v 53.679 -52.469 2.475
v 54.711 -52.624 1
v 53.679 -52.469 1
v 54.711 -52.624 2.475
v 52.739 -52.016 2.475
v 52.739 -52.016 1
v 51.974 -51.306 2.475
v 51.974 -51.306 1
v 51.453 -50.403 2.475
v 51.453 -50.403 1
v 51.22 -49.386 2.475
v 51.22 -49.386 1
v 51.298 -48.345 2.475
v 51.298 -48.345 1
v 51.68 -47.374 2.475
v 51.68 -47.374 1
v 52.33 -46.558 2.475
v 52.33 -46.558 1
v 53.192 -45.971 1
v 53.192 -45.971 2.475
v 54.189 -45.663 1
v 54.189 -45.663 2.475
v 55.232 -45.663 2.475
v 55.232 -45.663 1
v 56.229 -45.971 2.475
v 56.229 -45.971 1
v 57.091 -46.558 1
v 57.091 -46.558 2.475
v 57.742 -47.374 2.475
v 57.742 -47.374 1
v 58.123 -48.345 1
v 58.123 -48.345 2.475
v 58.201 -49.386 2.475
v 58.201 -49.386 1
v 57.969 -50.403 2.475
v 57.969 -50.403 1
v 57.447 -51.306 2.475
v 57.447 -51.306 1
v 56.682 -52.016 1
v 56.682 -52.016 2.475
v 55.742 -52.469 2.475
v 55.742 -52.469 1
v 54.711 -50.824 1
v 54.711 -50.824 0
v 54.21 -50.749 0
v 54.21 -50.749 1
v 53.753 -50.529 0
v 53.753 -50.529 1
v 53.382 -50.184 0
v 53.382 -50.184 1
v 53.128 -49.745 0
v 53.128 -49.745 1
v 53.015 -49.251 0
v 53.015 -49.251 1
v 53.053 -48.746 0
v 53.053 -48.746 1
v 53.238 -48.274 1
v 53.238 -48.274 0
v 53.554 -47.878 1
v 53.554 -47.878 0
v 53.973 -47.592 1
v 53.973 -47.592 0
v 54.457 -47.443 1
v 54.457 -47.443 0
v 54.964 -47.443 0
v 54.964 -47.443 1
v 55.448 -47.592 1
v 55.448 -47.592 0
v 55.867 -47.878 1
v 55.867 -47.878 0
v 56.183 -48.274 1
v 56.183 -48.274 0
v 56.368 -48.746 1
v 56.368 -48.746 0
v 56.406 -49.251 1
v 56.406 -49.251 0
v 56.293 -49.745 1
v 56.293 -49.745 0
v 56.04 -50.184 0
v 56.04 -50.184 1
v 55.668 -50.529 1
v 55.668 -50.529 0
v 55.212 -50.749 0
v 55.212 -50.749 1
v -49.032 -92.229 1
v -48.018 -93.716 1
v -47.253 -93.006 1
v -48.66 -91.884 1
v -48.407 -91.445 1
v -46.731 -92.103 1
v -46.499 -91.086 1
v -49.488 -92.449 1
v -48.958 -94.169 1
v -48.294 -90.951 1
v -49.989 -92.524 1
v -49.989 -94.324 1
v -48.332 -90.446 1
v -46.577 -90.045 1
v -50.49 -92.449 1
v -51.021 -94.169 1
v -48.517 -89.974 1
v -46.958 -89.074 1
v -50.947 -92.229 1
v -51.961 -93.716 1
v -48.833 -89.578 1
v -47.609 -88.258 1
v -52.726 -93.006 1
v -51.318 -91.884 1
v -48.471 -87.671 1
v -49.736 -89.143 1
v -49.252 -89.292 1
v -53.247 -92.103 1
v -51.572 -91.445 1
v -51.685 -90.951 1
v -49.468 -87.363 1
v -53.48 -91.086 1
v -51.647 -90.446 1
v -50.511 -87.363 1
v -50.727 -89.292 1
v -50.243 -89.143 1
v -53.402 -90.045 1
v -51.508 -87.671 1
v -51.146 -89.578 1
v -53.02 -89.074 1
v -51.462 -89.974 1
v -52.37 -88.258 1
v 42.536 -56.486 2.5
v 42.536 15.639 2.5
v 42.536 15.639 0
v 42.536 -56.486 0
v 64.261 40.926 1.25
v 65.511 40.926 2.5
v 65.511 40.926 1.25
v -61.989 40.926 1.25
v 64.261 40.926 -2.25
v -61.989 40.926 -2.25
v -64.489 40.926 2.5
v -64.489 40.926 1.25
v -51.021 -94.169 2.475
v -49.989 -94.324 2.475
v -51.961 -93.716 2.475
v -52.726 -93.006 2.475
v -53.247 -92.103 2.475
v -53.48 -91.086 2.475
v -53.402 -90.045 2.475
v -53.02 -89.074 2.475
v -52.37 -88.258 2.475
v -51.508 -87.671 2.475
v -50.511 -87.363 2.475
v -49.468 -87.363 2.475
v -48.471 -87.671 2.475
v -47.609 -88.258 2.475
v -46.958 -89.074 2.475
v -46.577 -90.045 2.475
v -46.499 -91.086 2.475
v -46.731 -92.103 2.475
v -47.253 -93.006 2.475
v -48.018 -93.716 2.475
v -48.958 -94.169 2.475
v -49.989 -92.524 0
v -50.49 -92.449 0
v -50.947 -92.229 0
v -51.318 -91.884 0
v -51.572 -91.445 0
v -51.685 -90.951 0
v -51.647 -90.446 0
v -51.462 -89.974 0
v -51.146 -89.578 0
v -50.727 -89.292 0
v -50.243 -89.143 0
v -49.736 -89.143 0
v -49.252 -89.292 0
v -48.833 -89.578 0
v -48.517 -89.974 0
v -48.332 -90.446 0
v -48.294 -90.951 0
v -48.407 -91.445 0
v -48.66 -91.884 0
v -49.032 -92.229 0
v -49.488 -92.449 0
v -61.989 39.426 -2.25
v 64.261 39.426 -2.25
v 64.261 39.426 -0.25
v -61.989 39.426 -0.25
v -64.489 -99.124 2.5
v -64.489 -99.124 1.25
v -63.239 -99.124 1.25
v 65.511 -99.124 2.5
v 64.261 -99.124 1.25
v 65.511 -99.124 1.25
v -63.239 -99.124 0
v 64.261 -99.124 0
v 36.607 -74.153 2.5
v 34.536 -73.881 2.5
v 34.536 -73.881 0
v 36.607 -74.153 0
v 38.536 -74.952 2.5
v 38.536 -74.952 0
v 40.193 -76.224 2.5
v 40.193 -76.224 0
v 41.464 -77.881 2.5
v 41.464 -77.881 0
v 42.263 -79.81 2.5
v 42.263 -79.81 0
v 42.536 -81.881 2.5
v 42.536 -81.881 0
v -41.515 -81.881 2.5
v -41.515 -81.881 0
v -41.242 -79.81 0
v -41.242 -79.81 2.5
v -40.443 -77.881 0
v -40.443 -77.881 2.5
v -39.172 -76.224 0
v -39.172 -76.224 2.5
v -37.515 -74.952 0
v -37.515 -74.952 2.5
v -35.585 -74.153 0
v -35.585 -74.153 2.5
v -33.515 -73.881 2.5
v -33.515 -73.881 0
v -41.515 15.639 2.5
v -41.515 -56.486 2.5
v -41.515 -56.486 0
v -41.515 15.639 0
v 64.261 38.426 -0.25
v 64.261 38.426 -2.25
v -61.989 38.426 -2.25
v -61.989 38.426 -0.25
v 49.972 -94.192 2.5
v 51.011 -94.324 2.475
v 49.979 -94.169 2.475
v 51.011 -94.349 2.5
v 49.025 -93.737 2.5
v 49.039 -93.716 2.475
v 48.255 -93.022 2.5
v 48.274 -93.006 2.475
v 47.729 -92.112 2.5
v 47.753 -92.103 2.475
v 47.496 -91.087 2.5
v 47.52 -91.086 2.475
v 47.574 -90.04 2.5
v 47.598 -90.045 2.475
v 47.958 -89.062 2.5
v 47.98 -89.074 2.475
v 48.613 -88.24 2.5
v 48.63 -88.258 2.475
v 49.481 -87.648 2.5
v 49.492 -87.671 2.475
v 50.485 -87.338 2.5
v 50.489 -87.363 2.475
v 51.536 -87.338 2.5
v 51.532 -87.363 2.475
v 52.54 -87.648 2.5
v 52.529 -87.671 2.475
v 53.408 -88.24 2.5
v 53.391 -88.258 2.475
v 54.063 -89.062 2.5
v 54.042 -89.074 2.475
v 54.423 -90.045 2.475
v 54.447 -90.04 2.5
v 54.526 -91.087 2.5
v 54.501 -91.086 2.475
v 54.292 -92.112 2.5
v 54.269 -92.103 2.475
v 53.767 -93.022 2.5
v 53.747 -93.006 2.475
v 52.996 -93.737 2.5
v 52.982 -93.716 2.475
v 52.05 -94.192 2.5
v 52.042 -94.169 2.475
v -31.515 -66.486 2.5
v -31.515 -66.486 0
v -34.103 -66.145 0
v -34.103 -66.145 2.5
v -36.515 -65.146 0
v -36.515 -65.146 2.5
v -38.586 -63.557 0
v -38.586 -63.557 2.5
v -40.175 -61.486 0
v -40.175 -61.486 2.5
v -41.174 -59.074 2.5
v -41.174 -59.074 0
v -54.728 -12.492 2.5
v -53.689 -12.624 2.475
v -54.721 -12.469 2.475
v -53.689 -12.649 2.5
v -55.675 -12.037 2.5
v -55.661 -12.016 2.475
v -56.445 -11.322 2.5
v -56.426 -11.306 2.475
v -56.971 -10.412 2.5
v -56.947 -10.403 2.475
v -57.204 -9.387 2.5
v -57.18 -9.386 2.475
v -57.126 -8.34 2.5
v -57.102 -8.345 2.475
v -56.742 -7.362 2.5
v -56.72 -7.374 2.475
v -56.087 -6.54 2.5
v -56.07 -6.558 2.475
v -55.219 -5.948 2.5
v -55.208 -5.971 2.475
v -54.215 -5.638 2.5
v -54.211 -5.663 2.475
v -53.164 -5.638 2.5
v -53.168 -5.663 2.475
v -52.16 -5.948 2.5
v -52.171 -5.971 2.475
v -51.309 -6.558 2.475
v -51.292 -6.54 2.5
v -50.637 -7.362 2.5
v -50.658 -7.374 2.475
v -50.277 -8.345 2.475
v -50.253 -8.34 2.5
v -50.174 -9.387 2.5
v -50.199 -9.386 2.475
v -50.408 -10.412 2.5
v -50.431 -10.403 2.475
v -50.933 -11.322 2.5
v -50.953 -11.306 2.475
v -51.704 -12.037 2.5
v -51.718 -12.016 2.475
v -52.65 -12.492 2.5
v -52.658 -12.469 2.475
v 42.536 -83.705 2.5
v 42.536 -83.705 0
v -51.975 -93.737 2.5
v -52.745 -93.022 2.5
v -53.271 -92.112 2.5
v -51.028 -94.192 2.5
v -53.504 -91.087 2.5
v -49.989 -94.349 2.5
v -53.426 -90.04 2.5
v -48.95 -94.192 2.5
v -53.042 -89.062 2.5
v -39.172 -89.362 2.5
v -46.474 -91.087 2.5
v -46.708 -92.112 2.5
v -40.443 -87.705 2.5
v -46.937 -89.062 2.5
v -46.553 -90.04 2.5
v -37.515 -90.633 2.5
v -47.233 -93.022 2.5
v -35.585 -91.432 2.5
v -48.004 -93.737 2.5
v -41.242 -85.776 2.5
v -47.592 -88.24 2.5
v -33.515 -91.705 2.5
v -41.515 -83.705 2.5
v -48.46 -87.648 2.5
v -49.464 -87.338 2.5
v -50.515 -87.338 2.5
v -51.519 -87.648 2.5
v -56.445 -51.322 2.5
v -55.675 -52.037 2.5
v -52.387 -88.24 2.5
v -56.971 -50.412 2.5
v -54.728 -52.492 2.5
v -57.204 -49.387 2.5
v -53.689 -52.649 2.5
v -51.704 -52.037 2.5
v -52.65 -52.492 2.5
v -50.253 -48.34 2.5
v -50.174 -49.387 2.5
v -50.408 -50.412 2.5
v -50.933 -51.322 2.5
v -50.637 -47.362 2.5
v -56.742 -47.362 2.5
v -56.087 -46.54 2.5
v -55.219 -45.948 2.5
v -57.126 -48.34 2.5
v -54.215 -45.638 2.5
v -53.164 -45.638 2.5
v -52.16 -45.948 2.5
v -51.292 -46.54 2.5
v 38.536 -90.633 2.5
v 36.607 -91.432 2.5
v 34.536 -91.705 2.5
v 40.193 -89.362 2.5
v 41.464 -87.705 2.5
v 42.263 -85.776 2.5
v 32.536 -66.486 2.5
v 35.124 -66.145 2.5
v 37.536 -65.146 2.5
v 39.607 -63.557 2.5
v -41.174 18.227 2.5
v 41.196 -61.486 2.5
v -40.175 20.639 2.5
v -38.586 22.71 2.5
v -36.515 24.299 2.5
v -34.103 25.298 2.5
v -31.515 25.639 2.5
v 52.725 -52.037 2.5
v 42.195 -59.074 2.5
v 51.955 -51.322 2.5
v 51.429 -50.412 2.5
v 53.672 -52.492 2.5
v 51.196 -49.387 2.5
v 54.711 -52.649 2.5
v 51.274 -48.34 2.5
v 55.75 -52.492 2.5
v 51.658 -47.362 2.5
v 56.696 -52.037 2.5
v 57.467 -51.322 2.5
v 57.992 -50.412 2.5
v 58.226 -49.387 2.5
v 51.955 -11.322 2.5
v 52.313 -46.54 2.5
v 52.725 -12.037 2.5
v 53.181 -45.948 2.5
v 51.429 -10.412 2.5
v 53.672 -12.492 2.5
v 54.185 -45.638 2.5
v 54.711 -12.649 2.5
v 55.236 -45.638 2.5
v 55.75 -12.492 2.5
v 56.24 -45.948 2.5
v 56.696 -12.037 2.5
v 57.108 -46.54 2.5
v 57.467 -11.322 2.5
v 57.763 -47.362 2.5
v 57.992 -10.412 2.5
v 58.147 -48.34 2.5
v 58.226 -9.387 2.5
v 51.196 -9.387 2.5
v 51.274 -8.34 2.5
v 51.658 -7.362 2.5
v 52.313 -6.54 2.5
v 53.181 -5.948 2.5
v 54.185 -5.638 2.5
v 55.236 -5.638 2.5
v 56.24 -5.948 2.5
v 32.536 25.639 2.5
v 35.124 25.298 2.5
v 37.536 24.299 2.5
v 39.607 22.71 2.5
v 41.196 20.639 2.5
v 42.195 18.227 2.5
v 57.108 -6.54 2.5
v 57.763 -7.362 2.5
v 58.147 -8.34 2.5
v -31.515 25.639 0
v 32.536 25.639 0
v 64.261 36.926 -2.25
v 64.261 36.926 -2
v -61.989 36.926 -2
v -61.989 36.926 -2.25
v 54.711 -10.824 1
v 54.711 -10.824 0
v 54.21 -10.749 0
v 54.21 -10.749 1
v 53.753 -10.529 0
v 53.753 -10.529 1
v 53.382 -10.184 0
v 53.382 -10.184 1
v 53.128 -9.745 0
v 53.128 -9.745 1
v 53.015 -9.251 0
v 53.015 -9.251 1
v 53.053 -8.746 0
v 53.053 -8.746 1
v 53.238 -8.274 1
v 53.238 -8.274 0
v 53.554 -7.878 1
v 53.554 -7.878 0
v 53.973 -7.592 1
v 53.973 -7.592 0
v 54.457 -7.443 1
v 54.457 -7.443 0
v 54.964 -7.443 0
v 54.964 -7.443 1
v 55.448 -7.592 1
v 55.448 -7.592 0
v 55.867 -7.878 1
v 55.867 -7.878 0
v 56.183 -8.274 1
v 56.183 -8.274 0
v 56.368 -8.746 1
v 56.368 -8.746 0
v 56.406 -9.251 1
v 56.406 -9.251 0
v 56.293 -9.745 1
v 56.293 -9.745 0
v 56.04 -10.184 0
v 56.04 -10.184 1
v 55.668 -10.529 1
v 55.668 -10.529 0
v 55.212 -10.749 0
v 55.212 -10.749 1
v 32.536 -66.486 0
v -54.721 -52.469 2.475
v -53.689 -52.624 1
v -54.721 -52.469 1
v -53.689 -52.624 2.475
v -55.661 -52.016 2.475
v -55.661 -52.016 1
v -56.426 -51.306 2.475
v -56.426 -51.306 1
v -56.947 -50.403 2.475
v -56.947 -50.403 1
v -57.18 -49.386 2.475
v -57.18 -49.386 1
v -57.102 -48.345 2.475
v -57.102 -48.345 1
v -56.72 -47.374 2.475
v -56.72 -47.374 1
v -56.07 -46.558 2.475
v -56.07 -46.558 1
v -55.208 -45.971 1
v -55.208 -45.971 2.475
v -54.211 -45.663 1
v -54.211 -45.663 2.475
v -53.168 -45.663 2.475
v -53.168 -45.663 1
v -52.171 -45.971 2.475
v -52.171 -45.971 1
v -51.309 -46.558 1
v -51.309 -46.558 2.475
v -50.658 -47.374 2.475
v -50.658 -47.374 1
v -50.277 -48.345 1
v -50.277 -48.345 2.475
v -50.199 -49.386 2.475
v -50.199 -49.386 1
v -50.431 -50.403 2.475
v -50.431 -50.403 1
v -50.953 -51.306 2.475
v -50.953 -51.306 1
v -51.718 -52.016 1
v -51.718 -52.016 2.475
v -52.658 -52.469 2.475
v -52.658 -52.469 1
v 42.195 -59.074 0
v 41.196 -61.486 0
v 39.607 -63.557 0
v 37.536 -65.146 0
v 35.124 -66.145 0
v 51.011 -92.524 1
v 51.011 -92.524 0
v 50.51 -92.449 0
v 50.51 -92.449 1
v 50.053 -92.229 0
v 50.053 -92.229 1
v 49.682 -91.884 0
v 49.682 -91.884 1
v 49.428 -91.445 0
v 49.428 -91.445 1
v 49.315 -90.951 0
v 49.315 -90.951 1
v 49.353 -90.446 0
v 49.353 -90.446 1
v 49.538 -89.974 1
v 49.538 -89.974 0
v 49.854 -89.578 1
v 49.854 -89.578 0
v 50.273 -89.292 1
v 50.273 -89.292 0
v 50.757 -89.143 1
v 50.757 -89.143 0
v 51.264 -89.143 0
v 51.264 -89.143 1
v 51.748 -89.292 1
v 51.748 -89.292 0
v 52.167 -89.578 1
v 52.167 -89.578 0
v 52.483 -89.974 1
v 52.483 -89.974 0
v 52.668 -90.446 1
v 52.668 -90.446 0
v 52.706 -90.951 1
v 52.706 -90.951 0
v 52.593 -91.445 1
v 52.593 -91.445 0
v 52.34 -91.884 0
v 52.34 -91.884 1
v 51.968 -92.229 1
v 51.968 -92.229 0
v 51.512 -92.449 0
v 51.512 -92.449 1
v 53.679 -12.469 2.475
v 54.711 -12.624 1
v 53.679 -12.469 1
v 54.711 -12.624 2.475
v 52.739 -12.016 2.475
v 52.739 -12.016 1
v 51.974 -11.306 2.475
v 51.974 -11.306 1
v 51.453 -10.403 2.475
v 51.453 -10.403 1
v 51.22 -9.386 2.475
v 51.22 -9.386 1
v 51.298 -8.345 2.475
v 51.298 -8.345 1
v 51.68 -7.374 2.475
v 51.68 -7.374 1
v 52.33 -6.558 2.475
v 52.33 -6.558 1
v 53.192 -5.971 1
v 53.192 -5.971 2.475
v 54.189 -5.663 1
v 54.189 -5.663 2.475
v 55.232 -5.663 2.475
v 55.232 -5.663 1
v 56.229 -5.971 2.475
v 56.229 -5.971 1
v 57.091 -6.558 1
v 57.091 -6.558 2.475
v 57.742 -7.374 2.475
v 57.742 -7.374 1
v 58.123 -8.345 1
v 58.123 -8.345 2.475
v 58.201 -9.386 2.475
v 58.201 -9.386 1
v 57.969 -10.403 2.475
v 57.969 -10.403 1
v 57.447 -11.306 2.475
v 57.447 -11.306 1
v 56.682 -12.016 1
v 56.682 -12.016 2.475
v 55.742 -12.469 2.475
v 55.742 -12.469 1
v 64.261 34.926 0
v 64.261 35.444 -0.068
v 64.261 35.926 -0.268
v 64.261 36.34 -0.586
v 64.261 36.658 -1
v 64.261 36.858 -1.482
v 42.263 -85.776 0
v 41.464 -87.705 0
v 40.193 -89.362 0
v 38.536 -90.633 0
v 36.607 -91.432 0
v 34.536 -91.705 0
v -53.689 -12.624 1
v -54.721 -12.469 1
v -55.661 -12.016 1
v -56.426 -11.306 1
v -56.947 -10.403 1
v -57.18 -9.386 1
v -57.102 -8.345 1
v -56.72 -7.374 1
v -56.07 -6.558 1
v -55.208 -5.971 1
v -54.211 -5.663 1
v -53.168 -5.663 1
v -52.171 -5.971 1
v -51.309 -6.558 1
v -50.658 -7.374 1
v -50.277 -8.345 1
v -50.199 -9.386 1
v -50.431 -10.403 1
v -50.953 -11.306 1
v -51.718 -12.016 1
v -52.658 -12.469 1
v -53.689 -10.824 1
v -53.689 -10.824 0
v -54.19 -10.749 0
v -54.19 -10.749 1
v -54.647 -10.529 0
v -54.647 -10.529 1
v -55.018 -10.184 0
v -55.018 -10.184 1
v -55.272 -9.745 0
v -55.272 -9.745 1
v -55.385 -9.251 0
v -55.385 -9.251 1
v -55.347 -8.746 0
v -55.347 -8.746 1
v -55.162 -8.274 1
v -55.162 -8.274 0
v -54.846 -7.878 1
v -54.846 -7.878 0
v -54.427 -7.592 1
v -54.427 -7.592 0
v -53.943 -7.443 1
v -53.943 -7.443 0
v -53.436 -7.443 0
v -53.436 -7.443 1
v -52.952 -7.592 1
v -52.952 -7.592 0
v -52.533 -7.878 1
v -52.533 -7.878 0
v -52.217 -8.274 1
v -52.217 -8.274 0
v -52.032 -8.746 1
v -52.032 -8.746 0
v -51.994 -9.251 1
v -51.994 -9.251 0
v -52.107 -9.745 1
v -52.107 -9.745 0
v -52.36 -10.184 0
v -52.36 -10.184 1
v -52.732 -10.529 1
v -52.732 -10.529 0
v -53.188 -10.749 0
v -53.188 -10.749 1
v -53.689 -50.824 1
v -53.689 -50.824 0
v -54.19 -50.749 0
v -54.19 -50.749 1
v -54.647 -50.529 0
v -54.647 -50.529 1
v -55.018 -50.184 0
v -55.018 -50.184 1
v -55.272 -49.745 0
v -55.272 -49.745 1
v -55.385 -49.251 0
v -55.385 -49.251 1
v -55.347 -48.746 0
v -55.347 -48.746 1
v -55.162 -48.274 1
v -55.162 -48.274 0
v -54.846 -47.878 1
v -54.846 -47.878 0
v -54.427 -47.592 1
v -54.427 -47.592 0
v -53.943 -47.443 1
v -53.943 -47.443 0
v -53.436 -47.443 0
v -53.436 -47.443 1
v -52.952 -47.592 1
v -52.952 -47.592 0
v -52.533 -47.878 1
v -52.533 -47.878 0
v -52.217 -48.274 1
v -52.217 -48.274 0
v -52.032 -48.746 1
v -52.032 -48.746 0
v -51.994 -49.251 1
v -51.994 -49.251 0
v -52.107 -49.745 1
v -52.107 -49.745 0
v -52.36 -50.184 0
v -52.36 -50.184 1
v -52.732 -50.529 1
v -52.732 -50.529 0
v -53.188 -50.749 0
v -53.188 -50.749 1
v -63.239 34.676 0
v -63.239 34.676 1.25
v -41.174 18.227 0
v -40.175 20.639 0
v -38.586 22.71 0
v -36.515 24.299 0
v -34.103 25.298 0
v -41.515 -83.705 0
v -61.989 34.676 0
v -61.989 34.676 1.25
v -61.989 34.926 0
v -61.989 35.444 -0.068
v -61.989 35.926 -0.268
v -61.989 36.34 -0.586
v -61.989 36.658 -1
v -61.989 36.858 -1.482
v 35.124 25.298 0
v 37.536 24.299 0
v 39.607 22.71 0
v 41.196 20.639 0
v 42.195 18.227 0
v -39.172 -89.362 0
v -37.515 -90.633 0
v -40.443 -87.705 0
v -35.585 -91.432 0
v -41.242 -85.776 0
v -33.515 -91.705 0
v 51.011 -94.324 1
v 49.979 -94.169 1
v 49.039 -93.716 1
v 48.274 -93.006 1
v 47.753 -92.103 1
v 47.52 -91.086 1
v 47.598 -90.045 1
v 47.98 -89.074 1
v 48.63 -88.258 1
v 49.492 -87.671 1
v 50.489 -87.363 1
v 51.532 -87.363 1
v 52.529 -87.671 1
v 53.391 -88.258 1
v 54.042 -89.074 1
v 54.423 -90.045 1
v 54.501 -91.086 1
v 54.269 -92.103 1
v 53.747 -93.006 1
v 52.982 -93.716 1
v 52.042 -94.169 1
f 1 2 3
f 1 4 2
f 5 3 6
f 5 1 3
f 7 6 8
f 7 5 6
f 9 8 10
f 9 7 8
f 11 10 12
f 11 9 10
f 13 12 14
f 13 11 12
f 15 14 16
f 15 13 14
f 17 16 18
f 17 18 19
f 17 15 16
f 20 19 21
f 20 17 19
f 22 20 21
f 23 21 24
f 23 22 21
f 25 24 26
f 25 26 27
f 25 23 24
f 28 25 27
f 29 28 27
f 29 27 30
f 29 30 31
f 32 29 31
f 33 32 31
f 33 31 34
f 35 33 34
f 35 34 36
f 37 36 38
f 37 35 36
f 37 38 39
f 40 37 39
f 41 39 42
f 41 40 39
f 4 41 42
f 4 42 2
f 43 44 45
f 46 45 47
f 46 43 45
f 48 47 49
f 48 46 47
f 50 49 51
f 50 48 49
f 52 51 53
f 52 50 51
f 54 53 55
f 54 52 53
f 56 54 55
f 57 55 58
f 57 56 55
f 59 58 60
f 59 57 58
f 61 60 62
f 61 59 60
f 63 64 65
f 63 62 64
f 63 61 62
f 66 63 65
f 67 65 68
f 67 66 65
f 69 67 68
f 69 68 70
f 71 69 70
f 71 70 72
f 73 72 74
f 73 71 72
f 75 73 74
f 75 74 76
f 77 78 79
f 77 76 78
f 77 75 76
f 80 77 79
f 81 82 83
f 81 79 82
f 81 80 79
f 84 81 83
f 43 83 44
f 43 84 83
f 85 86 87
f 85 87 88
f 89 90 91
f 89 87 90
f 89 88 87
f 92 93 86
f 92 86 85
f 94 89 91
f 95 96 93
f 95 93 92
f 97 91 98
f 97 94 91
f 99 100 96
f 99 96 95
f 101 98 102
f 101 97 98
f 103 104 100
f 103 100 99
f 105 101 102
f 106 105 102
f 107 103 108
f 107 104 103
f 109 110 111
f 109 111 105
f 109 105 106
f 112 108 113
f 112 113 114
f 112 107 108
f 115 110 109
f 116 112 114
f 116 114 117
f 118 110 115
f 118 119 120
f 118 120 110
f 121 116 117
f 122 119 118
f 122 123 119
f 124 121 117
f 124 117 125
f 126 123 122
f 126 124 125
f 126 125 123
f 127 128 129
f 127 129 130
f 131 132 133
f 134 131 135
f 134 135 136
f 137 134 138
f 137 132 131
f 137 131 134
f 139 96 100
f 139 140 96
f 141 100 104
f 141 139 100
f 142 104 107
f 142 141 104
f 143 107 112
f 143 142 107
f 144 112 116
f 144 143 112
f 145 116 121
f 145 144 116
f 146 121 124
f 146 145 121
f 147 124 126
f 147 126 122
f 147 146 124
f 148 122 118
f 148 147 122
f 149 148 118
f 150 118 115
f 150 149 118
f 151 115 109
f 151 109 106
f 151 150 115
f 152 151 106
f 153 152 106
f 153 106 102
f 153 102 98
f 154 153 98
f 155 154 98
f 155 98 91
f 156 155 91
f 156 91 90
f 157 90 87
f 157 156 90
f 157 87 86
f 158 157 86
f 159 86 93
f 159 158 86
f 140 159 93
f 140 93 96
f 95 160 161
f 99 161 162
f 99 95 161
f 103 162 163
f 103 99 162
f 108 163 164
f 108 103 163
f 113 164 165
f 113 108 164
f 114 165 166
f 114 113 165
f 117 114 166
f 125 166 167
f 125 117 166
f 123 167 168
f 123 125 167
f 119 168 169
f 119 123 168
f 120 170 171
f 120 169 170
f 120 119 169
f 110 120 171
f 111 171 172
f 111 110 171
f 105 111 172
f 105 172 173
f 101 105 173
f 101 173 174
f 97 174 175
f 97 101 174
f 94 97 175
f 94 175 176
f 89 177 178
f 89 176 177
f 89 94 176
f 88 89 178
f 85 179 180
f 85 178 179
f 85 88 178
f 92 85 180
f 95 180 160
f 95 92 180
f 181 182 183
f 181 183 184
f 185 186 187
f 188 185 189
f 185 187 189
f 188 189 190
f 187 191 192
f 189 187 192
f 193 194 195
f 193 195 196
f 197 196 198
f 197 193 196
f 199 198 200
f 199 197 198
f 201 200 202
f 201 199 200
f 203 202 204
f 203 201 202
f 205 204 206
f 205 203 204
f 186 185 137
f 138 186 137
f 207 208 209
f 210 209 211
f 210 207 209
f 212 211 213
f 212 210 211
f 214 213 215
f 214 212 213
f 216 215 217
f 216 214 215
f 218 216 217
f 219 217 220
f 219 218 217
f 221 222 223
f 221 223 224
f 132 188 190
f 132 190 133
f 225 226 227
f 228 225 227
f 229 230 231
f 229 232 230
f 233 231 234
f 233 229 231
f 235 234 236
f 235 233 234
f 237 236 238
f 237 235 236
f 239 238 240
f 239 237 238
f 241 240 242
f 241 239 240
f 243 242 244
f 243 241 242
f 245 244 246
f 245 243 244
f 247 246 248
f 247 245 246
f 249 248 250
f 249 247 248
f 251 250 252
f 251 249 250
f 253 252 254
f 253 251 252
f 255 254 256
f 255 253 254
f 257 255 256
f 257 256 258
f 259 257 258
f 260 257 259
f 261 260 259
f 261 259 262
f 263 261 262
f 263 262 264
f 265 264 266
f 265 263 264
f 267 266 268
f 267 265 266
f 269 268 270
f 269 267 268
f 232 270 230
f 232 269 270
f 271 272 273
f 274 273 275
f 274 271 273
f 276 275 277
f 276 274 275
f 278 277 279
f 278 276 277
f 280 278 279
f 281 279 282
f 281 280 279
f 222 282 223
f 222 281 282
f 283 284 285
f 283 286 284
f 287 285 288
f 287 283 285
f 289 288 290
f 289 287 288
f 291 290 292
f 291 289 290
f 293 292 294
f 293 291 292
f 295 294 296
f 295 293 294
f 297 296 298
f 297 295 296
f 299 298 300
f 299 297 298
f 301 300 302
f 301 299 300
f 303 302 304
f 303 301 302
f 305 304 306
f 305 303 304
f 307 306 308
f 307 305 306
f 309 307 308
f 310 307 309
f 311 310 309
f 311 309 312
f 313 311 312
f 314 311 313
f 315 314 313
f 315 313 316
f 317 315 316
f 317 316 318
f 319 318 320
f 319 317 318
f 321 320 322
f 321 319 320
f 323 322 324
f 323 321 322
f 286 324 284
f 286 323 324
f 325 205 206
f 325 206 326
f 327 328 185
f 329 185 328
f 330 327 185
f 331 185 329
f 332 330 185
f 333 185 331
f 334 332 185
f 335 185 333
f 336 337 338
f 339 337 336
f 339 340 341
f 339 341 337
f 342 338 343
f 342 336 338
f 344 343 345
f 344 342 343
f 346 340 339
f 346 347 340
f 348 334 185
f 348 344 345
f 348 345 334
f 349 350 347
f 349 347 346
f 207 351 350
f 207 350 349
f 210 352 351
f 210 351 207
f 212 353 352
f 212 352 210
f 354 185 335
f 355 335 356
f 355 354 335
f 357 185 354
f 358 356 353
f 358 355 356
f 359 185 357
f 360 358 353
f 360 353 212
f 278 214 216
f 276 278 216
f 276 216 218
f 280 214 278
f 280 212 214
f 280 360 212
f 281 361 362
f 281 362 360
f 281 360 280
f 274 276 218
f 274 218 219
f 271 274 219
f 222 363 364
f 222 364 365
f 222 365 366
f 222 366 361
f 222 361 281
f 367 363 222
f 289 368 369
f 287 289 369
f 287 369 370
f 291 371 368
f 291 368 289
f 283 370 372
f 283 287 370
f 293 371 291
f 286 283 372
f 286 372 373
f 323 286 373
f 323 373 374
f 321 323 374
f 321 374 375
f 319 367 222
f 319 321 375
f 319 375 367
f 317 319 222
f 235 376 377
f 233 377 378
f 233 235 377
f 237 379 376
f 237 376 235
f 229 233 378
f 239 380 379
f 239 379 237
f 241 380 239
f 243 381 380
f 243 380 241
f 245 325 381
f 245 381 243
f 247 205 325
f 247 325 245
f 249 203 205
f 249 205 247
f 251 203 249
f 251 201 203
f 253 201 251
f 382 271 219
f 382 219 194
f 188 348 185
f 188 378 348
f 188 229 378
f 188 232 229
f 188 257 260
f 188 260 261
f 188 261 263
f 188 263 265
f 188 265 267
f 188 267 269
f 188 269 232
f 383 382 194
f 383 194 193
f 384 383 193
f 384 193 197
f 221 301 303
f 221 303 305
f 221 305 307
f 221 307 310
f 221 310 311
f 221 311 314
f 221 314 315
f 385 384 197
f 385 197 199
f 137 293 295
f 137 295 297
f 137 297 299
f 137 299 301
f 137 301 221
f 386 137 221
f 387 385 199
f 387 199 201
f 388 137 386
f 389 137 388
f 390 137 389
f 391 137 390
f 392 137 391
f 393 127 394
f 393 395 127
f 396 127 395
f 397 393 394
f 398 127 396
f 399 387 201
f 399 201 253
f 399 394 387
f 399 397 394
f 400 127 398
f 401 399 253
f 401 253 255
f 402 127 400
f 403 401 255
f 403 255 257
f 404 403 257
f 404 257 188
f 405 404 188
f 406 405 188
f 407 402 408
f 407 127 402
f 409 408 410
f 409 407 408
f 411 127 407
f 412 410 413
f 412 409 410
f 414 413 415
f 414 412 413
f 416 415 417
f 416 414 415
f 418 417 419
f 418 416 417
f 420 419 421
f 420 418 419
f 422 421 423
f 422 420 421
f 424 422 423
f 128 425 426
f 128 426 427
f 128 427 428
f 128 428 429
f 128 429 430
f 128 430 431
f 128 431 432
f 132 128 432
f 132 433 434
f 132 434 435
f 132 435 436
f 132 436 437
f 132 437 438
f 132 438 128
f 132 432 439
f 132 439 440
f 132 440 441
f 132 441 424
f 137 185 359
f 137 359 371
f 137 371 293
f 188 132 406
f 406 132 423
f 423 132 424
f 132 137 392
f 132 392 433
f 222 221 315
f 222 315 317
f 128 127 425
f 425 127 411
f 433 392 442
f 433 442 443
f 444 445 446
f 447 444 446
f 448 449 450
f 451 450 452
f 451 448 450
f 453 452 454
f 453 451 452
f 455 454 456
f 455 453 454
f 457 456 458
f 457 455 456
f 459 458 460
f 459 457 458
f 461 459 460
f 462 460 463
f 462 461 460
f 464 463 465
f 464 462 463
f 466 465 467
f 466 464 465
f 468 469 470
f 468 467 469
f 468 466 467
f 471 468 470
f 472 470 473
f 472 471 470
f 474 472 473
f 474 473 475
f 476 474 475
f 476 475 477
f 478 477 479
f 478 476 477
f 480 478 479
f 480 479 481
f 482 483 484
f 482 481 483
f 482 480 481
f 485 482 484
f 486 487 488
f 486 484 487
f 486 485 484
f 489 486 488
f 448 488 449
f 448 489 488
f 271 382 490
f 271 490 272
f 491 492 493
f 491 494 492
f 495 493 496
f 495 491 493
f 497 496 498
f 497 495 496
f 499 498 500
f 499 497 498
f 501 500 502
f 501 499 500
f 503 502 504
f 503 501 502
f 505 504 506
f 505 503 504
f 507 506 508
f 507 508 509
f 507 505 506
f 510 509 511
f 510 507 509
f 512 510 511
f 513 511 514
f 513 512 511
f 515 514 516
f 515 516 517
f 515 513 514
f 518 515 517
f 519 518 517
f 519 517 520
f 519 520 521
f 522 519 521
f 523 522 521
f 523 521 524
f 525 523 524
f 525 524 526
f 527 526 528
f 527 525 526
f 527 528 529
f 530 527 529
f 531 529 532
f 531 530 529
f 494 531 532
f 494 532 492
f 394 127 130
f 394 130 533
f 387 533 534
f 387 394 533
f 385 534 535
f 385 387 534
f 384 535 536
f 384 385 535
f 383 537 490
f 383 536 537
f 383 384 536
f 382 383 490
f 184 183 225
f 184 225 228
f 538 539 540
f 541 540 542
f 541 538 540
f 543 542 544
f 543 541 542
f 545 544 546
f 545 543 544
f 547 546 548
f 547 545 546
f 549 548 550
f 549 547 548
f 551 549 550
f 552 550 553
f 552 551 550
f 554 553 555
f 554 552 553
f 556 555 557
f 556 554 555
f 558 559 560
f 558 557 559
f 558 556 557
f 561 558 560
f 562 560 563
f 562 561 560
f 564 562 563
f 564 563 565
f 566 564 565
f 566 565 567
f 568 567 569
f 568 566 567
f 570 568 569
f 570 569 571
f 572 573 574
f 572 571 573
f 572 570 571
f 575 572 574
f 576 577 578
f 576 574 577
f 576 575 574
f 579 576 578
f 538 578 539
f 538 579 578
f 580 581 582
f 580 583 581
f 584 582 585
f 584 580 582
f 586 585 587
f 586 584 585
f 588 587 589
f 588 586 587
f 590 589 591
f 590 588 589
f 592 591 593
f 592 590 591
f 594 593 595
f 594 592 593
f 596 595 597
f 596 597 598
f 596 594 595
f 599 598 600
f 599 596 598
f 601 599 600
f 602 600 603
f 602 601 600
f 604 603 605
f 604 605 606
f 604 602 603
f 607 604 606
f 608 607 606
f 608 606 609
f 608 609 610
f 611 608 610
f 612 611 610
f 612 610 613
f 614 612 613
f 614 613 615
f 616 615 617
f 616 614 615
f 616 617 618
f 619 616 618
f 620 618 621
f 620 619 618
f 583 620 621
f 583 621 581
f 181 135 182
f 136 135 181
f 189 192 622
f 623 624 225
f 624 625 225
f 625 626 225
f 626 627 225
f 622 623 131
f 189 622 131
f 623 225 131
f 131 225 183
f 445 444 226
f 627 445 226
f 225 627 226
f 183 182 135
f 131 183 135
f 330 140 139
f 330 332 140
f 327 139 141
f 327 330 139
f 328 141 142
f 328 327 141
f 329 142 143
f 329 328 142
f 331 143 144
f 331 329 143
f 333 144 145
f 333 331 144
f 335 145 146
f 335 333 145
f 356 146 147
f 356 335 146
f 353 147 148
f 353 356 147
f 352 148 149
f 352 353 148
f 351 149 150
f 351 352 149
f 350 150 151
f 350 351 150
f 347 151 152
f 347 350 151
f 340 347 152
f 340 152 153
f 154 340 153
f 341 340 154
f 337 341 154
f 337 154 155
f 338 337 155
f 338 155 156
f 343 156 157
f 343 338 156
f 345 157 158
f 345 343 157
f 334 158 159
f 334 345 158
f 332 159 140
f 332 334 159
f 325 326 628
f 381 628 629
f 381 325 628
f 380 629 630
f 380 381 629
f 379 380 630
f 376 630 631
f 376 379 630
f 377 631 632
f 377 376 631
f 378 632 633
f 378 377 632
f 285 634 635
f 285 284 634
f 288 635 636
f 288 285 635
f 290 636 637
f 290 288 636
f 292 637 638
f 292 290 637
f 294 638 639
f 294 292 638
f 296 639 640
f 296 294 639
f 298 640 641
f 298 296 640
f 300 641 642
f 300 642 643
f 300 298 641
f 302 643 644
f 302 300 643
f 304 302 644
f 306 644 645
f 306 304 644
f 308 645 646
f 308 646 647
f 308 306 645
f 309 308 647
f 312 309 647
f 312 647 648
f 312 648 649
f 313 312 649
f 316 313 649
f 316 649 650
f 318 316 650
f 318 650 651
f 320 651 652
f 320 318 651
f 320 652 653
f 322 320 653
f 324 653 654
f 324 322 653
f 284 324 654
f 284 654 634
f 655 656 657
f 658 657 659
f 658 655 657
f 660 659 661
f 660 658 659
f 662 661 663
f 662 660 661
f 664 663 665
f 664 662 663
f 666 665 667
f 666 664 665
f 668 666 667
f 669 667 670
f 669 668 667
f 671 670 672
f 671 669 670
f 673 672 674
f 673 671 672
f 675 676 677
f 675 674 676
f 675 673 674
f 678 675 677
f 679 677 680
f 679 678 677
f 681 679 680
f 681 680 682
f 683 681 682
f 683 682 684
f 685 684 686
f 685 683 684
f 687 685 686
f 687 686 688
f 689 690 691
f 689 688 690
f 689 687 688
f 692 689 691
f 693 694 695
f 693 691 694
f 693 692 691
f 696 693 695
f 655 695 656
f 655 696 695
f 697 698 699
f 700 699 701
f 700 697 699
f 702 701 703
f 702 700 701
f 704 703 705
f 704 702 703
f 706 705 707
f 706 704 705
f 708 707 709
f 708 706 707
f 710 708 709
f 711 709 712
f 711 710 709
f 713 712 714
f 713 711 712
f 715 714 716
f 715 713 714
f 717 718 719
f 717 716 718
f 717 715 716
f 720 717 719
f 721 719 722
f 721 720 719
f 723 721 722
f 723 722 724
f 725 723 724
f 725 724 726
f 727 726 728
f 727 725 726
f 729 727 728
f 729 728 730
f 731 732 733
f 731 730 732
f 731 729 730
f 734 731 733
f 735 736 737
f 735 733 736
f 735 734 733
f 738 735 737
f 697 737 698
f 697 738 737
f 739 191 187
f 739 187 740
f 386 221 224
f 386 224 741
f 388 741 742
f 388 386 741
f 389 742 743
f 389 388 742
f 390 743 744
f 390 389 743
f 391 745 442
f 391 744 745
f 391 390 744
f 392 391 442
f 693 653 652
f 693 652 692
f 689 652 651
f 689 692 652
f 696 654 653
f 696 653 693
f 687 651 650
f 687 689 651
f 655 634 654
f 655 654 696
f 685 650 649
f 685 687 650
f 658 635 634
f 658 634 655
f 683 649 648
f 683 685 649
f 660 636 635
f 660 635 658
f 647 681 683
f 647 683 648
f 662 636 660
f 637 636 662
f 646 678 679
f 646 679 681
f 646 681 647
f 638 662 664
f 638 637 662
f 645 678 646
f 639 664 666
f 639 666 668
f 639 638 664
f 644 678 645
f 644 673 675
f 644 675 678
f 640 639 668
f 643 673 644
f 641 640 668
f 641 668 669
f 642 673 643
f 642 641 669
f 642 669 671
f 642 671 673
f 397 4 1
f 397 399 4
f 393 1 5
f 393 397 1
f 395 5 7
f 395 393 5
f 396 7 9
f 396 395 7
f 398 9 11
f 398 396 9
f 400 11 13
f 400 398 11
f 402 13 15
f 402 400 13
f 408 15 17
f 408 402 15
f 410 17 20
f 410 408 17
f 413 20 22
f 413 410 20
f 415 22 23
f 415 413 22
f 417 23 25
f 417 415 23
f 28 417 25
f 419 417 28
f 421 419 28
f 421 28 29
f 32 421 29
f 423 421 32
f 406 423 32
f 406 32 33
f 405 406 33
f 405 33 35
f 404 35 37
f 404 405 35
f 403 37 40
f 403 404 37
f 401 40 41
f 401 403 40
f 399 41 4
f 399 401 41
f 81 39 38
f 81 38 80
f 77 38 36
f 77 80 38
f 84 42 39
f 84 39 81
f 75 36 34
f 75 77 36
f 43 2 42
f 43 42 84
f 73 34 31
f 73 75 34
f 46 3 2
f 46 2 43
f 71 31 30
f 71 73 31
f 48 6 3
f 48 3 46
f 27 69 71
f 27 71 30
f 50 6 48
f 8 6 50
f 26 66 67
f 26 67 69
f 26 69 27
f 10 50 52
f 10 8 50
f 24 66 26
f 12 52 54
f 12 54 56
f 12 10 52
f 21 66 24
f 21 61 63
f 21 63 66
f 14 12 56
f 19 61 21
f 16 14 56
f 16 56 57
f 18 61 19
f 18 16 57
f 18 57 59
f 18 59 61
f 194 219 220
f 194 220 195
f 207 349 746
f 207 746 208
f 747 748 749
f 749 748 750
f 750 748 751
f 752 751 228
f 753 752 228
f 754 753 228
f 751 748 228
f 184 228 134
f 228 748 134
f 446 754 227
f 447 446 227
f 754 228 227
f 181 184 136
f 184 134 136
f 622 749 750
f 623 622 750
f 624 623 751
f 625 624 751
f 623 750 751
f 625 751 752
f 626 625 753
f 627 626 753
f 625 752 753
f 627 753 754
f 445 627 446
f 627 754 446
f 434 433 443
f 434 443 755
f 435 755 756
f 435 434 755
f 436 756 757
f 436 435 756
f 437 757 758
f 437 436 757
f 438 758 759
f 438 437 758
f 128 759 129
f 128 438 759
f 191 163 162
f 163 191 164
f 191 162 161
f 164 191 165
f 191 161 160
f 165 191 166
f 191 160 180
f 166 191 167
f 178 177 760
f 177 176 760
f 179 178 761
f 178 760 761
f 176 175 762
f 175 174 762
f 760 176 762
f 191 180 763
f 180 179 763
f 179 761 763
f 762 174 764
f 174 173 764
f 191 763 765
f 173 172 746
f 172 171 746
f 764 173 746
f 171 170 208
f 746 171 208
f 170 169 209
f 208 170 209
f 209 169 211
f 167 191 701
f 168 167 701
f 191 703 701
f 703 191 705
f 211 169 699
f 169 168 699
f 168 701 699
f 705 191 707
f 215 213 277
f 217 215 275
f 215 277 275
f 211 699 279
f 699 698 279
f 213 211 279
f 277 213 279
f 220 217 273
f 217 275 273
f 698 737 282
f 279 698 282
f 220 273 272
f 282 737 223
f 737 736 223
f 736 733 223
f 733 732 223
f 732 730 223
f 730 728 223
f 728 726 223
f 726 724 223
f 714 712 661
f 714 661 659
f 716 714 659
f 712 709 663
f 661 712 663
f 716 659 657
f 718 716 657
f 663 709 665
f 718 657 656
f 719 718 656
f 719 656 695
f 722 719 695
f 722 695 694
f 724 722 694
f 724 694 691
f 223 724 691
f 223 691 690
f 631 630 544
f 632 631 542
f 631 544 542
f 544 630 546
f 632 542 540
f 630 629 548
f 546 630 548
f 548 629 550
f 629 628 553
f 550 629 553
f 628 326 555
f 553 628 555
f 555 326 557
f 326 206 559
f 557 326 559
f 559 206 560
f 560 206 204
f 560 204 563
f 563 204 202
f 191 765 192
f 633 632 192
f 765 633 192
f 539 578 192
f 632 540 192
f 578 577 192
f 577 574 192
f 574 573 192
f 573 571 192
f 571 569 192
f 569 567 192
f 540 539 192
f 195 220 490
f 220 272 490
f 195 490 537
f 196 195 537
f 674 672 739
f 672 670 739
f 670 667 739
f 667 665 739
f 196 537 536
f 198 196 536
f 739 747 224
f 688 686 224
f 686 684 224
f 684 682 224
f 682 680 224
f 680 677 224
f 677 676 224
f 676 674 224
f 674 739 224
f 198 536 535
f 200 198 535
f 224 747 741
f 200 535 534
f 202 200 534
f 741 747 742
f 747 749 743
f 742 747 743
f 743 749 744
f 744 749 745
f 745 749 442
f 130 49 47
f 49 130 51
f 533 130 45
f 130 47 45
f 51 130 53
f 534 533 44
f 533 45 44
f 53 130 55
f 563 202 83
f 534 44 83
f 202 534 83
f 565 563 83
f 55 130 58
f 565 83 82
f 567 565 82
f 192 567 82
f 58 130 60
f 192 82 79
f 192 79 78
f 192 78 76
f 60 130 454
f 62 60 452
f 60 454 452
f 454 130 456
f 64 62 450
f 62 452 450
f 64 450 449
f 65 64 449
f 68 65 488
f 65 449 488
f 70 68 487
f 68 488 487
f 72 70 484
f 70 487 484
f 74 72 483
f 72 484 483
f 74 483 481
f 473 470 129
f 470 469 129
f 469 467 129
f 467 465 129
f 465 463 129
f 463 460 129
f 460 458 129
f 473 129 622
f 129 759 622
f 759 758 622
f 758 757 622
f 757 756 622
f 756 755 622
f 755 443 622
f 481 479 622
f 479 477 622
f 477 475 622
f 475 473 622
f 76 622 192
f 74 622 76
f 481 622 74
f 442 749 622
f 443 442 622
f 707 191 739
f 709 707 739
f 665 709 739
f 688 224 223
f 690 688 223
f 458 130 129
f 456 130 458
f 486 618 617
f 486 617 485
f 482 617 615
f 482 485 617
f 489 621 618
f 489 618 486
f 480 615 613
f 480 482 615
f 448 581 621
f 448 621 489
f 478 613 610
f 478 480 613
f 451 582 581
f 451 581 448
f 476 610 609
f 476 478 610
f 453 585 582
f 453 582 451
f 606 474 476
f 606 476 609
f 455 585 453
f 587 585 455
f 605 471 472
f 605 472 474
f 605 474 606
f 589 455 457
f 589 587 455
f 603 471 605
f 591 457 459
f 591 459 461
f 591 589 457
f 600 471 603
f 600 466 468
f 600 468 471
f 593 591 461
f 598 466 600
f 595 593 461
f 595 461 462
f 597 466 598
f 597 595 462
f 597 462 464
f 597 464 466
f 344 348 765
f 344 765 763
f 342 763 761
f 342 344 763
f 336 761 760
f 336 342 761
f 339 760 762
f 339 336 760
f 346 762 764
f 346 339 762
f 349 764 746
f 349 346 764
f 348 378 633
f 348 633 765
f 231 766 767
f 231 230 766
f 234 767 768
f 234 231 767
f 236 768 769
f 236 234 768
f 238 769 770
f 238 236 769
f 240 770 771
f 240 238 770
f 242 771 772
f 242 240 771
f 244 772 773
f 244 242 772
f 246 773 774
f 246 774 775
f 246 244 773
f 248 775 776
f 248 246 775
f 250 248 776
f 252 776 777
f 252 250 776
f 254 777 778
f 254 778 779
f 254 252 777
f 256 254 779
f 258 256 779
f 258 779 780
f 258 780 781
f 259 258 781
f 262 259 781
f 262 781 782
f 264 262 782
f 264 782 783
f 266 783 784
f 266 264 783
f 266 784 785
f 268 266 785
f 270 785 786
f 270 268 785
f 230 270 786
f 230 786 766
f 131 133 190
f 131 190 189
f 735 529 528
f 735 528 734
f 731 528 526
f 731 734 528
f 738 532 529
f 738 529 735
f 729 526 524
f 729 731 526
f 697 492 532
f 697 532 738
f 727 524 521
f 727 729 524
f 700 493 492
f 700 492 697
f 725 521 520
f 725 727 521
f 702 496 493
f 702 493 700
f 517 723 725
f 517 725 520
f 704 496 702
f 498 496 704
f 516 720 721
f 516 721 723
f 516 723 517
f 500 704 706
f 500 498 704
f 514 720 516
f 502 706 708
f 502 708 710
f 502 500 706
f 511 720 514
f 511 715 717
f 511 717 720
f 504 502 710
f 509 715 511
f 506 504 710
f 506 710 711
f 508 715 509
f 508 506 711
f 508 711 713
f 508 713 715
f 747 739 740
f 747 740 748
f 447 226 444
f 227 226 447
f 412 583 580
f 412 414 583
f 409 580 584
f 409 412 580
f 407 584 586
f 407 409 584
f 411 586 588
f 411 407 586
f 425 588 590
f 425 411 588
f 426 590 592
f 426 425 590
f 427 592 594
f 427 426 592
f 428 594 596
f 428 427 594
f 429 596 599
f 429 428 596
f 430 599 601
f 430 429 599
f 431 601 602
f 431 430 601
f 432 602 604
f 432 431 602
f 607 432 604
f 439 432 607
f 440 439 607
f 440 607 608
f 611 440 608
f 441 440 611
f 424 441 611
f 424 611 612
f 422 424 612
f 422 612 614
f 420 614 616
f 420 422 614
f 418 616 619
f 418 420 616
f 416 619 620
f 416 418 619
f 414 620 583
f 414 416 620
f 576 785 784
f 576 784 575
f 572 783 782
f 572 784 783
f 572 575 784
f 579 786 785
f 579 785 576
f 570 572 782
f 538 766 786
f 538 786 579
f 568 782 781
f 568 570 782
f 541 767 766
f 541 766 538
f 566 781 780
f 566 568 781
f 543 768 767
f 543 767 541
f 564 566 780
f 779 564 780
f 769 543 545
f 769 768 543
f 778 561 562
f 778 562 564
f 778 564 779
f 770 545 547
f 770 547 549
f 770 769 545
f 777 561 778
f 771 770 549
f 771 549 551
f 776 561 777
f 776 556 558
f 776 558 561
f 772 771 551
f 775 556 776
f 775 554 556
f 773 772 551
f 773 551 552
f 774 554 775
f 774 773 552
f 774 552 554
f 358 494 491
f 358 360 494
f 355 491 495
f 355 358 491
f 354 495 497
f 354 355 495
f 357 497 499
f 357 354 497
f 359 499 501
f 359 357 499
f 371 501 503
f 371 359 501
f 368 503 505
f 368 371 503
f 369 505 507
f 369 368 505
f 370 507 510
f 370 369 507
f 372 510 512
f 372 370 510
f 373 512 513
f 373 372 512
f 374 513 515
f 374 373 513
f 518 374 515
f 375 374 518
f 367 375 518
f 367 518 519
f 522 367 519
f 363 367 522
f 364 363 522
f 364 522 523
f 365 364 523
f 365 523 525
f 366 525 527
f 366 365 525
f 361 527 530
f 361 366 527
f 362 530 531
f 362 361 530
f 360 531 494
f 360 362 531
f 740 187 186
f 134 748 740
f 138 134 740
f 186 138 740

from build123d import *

# Parameters (mm, degrees)
ESBO_O1_W                                      = 130
ESBO_O1_H                                      = 140.05
RESSALTO_EXTRUS_O1_DEPTH                       = 2.5
ESBO_O2_W                                      = 130
ESBO_O2_H                                      = 4
RESSALTO_EXTRUS_O2_DEPTH                       = 2.25
FILETE1_R                                      = 2
ESBO_O3_W                                      = 130
ESBO_O3_H                                      = 1
CORTE_EXTRUS_O1_DEPTH                          = 2
ESBO_O6_W                                      = 1.25
ESBO_O6_H                                      = 140.05
CORTE_EXTRUS_O2_DEPTH                          = 3.5
ESBO_O8_W                                      = 1.25
ESBO_O8_H                                      = 3.5
CORTE_EXTRUS_O3_DEPTH                          = 6.25
REBAIXO_PARA_PARAFUSO_COM_CABE_A_PAN_2_COUNT   = 2
REBAIXO_PARA_PARAFUSO_COM_CABE_A_PAN_2_PITCH   = 40
REBAIXO_PARA_PARAFUSO_COM_CABE_A_PAN_3_COUNT   = 2
REBAIXO_PARA_PARAFUSO_COM_CABE_A_PAN_3_PITCH   = 108.4
REBAIXO_PARA_PARAFUSO_COM_CABE_A_PAN_4_COUNT   = 2
REBAIXO_PARA_PARAFUSO_COM_CABE_A_PAN_4_PITCH   = 115.544623415
CORTE_EXTRUS_O5_DEPTH                          = 8.25
REBAIXO_PARA_PARAFUSO_COM_CABE_A_PAN_5_A_COUNT = 2
REBAIXO_PARA_PARAFUSO_COM_CABE_A_PAN_5_A_PITCH = 101


with BuildPart() as part:
    # Esboço1 → Ressalto-extrusão1 (new body)
    with BuildSketch(Plane.XY):
        with Locations((0.510662177, -29.099074074)):
            Rectangle(ESBO_O1_W, ESBO_O1_H)
    extrude(amount=RESSALTO_EXTRUS_O1_DEPTH)

    # Esboço2 → Ressalto-extrusão2 (add)
    with BuildSketch(Plane(origin=(0, 0, 0), x_dir=(-1, 0, 0), z_dir=(0, 0, -1))):
        with Locations((-0.510662177, 38.925925926)):
            Rectangle(ESBO_O2_W, ESBO_O2_H)
    extrude(amount=RESSALTO_EXTRUS_O2_DEPTH)

    # Filete1
    filete1_edges = [part.edges().sort_by_distance(p)[0] for p in [
        (0.510662177, 36.925925926, 0),
    ]]
    fillet(filete1_edges, radius=FILETE1_R)

    # Esboço3 → Corte-extrusão1 (cut)
    with BuildSketch(Plane(origin=(0, 0, -2.25), x_dir=(-1, 0, 0), z_dir=(0, 0, -1))):
        with Locations((-0.510662177, 38.925925926)):
            Rectangle(ESBO_O3_W, ESBO_O3_H)
    extrude(amount=-CORTE_EXTRUS_O1_DEPTH, mode=Mode.SUBTRACT)

    # Esboço6 → Corte-extrusão2 (cut)
    with BuildSketch(Plane(origin=(0, 0, -2.25), x_dir=(-1, 0, 0), z_dir=(0, 0, -1))):
        with Locations((-64.885662177, -29.099074074)):
            Rectangle(ESBO_O6_W, ESBO_O6_H)
        with Locations((63.864337823, -29.099074074)):
            Rectangle(ESBO_O6_W, ESBO_O6_H)
    extrude(amount=-CORTE_EXTRUS_O2_DEPTH, mode=Mode.SUBTRACT)

    # Esboço8 → Corte-extrusão3 (cut)
    with BuildSketch(Plane(origin=(0, 40.925925926, 0), x_dir=(1, 0, 0), z_dir=(0, 1, 0))):
        with Locations((-62.614337823, 0.5)):
            Rectangle(ESBO_O8_W, ESBO_O8_H)
    extrude(amount=-CORTE_EXTRUS_O3_DEPTH, mode=Mode.SUBTRACT)

    # Esboço12 → Rebaixo para parafuso com cabe_a panela (revolve, cut)
    with BuildSketch(Plane(origin=(-53.689337823, -9.124074074, 2.5), x_dir=(0, -1, 0), z_dir=(1, 0, 0))):
        Polygon((0, 0), (0, 4.75), (1.7, 4.75), (1.7, 1.5), (3.5, 1.5), (3.5, 0.025), (3.525, 0), align=None)
    rebaixo_para_parafuso_com_cabe_a_panela = revolve(axis=Axis((-53.689337823, -9.124074074, 8.85), (0, 0, -1)), mode=Mode.SUBTRACT)

    # Rebaixo para parafuso com cabe_a pan 2: Rebaixo para parafuso com cabe_a panela ×2
    with Locations(*[(0, -i * REBAIXO_PARA_PARAFUSO_COM_CABE_A_PAN_2_PITCH, 0) for i in range(1, REBAIXO_PARA_PARAFUSO_COM_CABE_A_PAN_2_COUNT)]):
        add(rebaixo_para_parafuso_com_cabe_a_panela, mode=Mode.SUBTRACT)

    # Rebaixo para parafuso com cabe_a pan 3: Rebaixo para parafuso com cabe_a panela ×2
    with Locations(*[(i * REBAIXO_PARA_PARAFUSO_COM_CABE_A_PAN_3_PITCH, 0, 0) for i in range(1, REBAIXO_PARA_PARAFUSO_COM_CABE_A_PAN_3_COUNT)]):
        add(rebaixo_para_parafuso_com_cabe_a_panela, mode=Mode.SUBTRACT)

    # Rebaixo para parafuso com cabe_a pan 4: Rebaixo para parafuso com cabe_a panela ×2
    with Locations(*[Vector(0.9381656783035653, -0.3461865971599872, 0) * (i * REBAIXO_PARA_PARAFUSO_COM_CABE_A_PAN_4_PITCH) for i in range(1, REBAIXO_PARA_PARAFUSO_COM_CABE_A_PAN_4_COUNT)]):
        add(rebaixo_para_parafuso_com_cabe_a_panela, mode=Mode.SUBTRACT)

    # Esboço13 → Corte-extrusão5 (cut)
    with BuildSketch(Plane.XY.offset(2.5)):
        with BuildLine():
            Line((32.535999817, -66.48621762), (-31.514675462, -66.48621762))
            ThreePointArc((-31.514675462, -66.48621762), (-38.585743274, -63.557285432), (-41.514675462, -56.48621762))
            Line((-41.514675462, -56.48621762), (-41.514675462, 15.639195022))
            ThreePointArc((-41.514675462, 15.639195022), (-38.585743274, 22.710262834), (-31.514675462, 25.639195022))
            Line((-31.514675462, 25.639195022), (32.535999817, 25.639195022))
            ThreePointArc((32.535999817, 25.639195022), (39.607067629, 22.710262834), (42.535999817, 15.639195022))
            Line((42.535999817, 15.639195022), (42.535999817, -56.48621762))
            ThreePointArc((42.535999817, -56.48621762), (39.607067629, -63.557285432), (32.535999817, -66.48621762))
        make_face()
        with BuildLine():
            Line((34.535999817, -91.70501851), (-33.514675462, -91.70501851))
            ThreePointArc((-33.514675462, -91.70501851), (-39.171529712, -89.361872759), (-41.514675462, -83.70501851))
            Line((-41.514675462, -83.70501851), (-41.514675462, -81.880603518))
            ThreePointArc((-41.514675462, -81.880603518), (-39.171529712, -76.223749269), (-33.514675462, -73.880603518))
            Line((-33.514675462, -73.880603518), (34.535999817, -73.880603518))
            ThreePointArc((34.535999817, -73.880603518), (40.192854066, -76.223749269), (42.535999817, -81.880603518))
            Line((42.535999817, -81.880603518), (42.535999817, -83.70501851))
            ThreePointArc((42.535999817, -83.70501851), (40.192854066, -89.361872759), (34.535999817, -91.70501851))
        make_face()
    extrude(amount=-CORTE_EXTRUS_O5_DEPTH, mode=Mode.SUBTRACT)

    # Esboço16 → Rebaixo para parafuso com cabe_a pan 5 (revolve, cut)
    with BuildSketch(Plane(origin=(-49.989337823, -90.824074074, 2.5), x_dir=(0, -1, 0), z_dir=(1, 0, 0))):
        Polygon((0, 0), (0, 4.75), (1.7, 4.75), (1.7, 1.5), (3.5, 1.5), (3.5, 0.025), (3.525, 0), align=None)
    rebaixo_para_parafuso_com_cabe_a_pan_5 = revolve(axis=Axis((-49.989337823, -90.824074074, 8.85), (0, 0, -1)), mode=Mode.SUBTRACT)

    # Rebaixo para parafuso com cabe_a pan 5 a: Rebaixo para parafuso com cabe_a pan 5 ×2
    with Locations(*[(i * REBAIXO_PARA_PARAFUSO_COM_CABE_A_PAN_5_A_PITCH, 0, 0) for i in range(1, REBAIXO_PARA_PARAFUSO_COM_CABE_A_PAN_5_A_COUNT)]):
        add(rebaixo_para_parafuso_com_cabe_a_pan_5, mode=Mode.SUBTRACT)


solid = part.part
